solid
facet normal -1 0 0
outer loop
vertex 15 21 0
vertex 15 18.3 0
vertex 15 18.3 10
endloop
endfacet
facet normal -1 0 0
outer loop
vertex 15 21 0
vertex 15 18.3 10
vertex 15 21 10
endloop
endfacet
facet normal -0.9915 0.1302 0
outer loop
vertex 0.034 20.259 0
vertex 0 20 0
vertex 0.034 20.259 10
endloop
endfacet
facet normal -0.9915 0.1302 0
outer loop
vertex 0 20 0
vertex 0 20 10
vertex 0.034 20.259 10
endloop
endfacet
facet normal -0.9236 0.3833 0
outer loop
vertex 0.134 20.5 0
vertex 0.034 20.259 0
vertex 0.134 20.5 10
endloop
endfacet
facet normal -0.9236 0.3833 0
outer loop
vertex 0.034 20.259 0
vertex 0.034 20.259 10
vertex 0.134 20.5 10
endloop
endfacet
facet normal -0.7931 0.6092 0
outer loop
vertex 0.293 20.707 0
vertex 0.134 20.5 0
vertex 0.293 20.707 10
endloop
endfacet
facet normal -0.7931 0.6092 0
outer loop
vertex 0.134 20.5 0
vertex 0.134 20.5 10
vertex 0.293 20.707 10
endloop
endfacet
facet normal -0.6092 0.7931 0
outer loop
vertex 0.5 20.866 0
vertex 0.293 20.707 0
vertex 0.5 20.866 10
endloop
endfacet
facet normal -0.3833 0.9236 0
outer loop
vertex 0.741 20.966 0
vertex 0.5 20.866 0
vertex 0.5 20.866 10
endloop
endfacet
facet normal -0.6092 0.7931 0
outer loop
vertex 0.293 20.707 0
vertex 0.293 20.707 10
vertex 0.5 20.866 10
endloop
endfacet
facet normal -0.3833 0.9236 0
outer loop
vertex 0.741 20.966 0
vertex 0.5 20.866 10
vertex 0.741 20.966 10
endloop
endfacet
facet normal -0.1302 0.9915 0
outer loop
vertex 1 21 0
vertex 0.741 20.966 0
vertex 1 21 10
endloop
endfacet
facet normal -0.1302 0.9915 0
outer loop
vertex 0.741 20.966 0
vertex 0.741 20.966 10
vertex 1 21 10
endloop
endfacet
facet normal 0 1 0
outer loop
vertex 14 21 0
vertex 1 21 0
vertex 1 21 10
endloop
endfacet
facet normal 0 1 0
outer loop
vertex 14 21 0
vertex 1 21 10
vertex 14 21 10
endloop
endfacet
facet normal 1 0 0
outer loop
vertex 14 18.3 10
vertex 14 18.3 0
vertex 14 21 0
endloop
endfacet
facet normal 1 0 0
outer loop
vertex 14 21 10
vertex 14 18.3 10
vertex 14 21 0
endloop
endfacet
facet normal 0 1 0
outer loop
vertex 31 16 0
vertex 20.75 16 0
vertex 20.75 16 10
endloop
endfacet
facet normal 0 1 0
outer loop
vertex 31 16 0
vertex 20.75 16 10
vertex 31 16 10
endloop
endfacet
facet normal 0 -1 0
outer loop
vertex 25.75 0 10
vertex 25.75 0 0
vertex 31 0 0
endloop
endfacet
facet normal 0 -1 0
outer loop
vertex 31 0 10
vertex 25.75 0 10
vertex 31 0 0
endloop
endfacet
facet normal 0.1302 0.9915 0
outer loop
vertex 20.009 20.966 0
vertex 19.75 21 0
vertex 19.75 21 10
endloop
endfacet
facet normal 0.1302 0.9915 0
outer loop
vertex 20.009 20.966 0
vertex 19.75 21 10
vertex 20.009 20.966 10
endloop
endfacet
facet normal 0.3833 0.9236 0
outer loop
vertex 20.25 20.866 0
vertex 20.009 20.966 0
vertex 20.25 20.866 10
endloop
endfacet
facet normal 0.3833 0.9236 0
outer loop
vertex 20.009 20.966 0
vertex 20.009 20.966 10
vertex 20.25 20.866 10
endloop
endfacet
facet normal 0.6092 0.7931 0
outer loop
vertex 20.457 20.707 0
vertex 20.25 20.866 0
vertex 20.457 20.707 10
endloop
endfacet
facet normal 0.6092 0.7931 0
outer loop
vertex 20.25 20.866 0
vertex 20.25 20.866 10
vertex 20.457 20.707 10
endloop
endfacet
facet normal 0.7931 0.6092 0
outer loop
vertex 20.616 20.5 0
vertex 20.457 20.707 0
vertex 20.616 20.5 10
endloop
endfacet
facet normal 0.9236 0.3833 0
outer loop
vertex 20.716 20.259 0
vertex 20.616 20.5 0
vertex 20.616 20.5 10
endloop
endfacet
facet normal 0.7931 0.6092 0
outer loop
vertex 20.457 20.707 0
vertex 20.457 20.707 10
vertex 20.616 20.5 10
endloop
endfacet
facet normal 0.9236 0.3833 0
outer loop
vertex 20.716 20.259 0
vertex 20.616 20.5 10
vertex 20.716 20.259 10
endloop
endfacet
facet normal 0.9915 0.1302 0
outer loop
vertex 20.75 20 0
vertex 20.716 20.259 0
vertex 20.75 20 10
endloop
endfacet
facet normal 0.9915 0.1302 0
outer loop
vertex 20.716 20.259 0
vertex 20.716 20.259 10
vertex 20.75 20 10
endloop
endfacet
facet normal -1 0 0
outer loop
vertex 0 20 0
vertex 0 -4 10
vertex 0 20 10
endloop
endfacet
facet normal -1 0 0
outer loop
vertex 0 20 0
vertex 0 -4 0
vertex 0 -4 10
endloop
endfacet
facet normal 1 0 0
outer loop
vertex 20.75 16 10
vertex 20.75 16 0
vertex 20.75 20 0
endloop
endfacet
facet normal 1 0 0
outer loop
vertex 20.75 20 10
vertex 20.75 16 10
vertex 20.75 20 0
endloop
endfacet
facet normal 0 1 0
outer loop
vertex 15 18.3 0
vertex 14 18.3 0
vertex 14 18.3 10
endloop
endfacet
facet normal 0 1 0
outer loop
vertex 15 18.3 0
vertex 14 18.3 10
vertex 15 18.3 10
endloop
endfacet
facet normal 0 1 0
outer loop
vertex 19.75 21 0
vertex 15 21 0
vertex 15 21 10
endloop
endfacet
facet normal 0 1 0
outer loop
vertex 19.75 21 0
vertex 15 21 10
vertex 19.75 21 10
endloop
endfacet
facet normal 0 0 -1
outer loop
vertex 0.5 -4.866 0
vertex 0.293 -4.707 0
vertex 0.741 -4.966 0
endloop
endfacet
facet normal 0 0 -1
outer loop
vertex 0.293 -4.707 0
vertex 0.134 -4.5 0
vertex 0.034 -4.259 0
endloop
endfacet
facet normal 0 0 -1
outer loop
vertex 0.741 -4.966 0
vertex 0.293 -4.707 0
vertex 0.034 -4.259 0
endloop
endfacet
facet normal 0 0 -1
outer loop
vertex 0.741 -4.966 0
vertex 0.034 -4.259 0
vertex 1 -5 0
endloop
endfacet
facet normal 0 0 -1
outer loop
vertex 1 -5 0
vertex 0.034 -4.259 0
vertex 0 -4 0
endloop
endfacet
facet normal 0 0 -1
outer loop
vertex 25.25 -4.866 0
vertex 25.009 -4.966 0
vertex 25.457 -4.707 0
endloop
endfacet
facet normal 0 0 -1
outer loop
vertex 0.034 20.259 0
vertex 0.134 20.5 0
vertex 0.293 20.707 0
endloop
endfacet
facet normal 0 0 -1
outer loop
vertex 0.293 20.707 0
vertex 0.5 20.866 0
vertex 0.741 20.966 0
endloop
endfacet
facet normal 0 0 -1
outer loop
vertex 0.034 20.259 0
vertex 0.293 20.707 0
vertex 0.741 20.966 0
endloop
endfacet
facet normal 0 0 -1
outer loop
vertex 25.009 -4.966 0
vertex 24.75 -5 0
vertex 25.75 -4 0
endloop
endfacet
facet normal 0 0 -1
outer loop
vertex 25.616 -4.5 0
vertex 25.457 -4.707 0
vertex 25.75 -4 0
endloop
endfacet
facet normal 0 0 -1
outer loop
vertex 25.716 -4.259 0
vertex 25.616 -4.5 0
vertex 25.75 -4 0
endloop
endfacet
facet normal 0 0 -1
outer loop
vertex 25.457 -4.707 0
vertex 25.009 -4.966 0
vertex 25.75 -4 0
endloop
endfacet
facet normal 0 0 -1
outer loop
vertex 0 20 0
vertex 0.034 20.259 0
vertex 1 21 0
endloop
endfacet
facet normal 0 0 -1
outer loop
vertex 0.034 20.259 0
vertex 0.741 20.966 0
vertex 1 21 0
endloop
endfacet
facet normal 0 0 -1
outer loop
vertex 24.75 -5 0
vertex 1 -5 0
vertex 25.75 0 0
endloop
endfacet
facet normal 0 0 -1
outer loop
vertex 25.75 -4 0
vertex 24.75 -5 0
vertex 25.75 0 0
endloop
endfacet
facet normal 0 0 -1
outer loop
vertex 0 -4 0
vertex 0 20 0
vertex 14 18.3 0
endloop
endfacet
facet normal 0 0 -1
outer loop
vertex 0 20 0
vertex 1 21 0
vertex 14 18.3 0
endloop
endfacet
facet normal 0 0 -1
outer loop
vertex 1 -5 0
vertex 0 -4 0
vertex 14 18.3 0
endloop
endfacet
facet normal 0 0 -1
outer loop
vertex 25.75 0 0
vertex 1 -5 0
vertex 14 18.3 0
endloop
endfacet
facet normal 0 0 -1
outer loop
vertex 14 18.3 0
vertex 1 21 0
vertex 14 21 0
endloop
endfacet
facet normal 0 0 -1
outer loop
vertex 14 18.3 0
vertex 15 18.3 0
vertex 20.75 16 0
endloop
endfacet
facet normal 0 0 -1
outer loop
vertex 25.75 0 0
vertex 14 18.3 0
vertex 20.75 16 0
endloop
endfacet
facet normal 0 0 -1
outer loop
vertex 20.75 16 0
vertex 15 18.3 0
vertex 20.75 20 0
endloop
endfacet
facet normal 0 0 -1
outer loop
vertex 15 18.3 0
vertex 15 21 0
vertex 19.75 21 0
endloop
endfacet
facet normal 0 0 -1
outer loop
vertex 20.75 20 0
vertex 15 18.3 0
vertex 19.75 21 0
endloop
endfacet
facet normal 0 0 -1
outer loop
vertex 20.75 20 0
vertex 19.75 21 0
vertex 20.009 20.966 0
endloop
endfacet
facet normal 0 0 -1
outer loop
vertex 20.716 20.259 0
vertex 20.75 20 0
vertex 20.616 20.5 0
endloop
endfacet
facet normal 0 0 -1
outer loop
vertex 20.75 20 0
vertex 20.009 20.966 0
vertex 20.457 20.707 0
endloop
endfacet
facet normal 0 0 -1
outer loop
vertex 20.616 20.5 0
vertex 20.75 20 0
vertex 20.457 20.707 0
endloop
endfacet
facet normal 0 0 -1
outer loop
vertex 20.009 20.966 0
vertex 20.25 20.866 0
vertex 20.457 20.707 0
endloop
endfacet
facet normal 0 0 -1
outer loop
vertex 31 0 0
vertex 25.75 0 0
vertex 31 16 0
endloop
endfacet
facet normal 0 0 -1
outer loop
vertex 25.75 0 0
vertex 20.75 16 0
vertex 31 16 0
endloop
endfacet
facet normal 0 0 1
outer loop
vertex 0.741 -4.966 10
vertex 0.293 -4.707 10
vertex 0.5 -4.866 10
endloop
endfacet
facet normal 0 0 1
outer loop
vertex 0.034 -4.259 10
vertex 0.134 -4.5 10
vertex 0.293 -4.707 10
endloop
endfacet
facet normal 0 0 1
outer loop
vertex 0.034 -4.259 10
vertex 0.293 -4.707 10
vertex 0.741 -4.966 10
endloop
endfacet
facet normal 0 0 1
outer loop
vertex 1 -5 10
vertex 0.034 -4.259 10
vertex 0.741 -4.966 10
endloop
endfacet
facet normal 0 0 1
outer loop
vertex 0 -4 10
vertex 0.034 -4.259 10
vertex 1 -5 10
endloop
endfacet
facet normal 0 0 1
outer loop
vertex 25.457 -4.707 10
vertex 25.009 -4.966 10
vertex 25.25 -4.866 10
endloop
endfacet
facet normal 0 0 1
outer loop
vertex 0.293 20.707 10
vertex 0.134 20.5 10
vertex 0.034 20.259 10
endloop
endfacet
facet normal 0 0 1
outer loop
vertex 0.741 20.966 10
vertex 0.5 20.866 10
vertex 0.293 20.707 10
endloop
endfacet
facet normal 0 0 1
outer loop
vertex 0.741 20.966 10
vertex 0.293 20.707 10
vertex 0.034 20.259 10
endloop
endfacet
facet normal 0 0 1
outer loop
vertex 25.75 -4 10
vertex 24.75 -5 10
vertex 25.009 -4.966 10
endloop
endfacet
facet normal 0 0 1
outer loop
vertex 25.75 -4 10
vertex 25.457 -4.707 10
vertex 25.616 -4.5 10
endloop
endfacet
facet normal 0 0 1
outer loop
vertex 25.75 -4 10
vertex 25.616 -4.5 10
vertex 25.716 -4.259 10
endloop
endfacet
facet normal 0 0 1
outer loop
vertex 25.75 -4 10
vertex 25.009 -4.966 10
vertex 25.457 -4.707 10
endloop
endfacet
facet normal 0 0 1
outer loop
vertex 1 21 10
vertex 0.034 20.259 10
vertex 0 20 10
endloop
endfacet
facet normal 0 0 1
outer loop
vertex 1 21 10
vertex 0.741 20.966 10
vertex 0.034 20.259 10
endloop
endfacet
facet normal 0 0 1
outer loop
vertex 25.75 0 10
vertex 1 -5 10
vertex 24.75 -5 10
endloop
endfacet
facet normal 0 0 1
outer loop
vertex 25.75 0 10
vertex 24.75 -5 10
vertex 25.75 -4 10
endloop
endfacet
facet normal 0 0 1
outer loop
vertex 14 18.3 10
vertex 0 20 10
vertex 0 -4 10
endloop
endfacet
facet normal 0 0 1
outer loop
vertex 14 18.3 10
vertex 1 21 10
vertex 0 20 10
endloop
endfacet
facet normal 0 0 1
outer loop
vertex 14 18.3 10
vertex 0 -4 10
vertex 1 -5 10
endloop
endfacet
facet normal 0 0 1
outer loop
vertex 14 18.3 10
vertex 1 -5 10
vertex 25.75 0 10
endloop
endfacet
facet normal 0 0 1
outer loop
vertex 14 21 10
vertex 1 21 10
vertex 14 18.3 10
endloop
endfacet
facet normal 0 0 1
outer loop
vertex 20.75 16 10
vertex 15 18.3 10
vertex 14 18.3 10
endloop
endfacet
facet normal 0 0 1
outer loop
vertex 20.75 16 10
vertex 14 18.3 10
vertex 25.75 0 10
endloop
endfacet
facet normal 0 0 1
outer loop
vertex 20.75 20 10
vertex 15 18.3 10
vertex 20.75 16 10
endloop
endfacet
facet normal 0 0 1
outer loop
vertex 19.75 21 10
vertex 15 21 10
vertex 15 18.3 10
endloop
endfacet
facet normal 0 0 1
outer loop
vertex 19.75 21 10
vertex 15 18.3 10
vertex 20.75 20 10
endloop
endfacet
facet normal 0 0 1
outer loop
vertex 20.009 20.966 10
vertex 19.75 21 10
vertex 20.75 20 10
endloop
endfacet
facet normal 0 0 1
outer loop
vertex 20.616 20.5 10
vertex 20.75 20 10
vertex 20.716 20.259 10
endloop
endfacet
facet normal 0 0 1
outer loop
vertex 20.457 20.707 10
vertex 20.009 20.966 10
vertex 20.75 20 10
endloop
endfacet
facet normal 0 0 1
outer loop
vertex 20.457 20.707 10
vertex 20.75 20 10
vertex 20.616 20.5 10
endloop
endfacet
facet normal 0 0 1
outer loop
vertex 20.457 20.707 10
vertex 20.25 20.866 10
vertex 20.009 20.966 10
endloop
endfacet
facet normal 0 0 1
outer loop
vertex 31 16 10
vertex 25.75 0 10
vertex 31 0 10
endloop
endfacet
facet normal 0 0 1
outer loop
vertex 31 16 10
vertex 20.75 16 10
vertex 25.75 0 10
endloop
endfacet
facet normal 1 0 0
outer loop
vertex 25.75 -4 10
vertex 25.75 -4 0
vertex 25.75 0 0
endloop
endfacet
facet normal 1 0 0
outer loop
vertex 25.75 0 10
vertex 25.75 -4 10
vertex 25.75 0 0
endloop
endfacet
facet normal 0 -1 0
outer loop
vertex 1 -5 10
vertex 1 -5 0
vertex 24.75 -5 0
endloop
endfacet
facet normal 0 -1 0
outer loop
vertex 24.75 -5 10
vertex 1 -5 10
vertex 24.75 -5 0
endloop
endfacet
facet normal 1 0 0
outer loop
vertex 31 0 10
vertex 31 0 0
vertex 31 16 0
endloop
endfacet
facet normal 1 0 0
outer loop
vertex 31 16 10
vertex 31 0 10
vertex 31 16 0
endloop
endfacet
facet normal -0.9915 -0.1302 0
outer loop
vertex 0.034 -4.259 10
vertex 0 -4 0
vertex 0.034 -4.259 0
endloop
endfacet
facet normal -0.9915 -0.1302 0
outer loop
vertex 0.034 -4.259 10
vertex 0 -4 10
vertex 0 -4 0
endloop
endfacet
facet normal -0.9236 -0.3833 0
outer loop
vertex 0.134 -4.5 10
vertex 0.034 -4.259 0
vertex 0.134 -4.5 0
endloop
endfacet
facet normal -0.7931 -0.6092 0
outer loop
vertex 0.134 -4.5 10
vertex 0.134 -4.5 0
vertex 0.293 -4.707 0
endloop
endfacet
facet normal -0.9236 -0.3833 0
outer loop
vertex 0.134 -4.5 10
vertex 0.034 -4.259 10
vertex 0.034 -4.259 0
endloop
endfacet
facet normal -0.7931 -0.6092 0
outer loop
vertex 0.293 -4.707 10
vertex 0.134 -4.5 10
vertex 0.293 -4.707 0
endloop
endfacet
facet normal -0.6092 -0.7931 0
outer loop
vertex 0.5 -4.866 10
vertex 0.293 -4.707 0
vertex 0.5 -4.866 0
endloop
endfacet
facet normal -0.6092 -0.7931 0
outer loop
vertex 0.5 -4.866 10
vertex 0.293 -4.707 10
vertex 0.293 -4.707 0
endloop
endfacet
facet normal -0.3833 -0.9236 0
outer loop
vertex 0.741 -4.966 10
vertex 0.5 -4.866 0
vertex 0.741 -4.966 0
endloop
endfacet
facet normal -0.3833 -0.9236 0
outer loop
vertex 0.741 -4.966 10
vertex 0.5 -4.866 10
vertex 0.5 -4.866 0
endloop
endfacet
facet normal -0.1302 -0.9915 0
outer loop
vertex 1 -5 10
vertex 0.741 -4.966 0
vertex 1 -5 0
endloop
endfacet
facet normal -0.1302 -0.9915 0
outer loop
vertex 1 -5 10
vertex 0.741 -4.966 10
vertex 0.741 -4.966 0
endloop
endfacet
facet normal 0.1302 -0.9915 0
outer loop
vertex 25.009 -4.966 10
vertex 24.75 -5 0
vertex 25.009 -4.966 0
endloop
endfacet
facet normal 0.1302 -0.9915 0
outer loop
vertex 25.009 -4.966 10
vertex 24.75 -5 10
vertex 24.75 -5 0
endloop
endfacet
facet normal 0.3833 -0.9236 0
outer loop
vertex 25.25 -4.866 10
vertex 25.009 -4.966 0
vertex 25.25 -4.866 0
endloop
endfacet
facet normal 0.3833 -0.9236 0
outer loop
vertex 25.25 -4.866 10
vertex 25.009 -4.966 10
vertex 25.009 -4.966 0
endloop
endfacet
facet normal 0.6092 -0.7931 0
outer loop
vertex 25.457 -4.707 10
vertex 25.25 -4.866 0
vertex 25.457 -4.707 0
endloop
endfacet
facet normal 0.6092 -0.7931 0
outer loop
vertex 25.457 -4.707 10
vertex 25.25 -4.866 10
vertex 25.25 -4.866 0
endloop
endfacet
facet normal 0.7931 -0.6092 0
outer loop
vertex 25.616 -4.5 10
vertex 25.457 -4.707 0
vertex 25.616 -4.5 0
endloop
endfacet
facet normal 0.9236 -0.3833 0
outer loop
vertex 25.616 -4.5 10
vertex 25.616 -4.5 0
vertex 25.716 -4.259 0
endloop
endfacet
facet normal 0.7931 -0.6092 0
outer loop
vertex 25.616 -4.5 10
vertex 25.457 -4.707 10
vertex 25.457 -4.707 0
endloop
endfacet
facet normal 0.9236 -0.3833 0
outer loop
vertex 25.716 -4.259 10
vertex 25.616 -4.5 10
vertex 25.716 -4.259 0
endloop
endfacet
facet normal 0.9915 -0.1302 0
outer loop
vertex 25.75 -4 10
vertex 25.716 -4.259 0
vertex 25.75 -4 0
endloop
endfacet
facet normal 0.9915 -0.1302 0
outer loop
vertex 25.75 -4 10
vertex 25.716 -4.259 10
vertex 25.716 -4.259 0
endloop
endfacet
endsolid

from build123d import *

# Parameters (mm, degrees)
BOX003_W     = 1
BOX003_H     = 2.7
BOX003_DEPTH = 10
BOX001_W     = 20.75
BOX001_H     = 5
BOX001_DEPTH = 10
BOX002_W     = 25.75
BOX002_H     = 5
BOX002_DEPTH = 10
BOX_W        = 31
BOX_H        = 16
BOX_DEPTH    = 10
FILLET_R     = 1


with BuildPart() as cube003:
    # Box003 → Box003 (new body)
    with BuildSketch(Plane(origin=(14, 18.3, 0), x_dir=(1, 0, 0), z_dir=(0, 0, 1))):
        with Locations((0.5, 1.35)):
            Rectangle(BOX003_W, BOX003_H)
    extrude(amount=BOX003_DEPTH)


with BuildPart() as cube001:
    # Box001 → Box001 (new body)
    with BuildSketch(Plane(origin=(0, 16, 0), x_dir=(1, 0, 0), z_dir=(0, 0, 1))):
        with Locations((10.375, 2.5)):
            Rectangle(BOX001_W, BOX001_H)
    extrude(amount=BOX001_DEPTH)


with BuildPart() as cube002:
    # Box002 → Box002 (new body)
    with BuildSketch(Plane(origin=(0, -5, 0), x_dir=(1, 0, 0), z_dir=(0, 0, 1))):
        with Locations((12.875, 2.5)):
            Rectangle(BOX002_W, BOX002_H)
    extrude(amount=BOX002_DEPTH)


with BuildPart() as fillet_body:
    # Box → Box (new body)
    with BuildSketch(Plane.XY):
        with Locations((15.5, 8)):
            Rectangle(BOX_W, BOX_H)
    extrude(amount=BOX_DEPTH)

    # Fusion: union Cube001, Cube002
    add(cube001.part)
    add(cube002.part)

    # Cut: cut Cube003
    add(cube003.part, mode=Mode.SUBTRACT)

    # Fillet
    fillet_edges = [fillet_body.edges().sort_by_distance(p)[0] for p in [
        (0, -5, 5),
        (25.75, -5, 5),
        (20.75, 21, 5),
        (0, 21, 5),
    ]]
    fillet(fillet_edges, radius=FILLET_R)


solid = fillet_body.part
